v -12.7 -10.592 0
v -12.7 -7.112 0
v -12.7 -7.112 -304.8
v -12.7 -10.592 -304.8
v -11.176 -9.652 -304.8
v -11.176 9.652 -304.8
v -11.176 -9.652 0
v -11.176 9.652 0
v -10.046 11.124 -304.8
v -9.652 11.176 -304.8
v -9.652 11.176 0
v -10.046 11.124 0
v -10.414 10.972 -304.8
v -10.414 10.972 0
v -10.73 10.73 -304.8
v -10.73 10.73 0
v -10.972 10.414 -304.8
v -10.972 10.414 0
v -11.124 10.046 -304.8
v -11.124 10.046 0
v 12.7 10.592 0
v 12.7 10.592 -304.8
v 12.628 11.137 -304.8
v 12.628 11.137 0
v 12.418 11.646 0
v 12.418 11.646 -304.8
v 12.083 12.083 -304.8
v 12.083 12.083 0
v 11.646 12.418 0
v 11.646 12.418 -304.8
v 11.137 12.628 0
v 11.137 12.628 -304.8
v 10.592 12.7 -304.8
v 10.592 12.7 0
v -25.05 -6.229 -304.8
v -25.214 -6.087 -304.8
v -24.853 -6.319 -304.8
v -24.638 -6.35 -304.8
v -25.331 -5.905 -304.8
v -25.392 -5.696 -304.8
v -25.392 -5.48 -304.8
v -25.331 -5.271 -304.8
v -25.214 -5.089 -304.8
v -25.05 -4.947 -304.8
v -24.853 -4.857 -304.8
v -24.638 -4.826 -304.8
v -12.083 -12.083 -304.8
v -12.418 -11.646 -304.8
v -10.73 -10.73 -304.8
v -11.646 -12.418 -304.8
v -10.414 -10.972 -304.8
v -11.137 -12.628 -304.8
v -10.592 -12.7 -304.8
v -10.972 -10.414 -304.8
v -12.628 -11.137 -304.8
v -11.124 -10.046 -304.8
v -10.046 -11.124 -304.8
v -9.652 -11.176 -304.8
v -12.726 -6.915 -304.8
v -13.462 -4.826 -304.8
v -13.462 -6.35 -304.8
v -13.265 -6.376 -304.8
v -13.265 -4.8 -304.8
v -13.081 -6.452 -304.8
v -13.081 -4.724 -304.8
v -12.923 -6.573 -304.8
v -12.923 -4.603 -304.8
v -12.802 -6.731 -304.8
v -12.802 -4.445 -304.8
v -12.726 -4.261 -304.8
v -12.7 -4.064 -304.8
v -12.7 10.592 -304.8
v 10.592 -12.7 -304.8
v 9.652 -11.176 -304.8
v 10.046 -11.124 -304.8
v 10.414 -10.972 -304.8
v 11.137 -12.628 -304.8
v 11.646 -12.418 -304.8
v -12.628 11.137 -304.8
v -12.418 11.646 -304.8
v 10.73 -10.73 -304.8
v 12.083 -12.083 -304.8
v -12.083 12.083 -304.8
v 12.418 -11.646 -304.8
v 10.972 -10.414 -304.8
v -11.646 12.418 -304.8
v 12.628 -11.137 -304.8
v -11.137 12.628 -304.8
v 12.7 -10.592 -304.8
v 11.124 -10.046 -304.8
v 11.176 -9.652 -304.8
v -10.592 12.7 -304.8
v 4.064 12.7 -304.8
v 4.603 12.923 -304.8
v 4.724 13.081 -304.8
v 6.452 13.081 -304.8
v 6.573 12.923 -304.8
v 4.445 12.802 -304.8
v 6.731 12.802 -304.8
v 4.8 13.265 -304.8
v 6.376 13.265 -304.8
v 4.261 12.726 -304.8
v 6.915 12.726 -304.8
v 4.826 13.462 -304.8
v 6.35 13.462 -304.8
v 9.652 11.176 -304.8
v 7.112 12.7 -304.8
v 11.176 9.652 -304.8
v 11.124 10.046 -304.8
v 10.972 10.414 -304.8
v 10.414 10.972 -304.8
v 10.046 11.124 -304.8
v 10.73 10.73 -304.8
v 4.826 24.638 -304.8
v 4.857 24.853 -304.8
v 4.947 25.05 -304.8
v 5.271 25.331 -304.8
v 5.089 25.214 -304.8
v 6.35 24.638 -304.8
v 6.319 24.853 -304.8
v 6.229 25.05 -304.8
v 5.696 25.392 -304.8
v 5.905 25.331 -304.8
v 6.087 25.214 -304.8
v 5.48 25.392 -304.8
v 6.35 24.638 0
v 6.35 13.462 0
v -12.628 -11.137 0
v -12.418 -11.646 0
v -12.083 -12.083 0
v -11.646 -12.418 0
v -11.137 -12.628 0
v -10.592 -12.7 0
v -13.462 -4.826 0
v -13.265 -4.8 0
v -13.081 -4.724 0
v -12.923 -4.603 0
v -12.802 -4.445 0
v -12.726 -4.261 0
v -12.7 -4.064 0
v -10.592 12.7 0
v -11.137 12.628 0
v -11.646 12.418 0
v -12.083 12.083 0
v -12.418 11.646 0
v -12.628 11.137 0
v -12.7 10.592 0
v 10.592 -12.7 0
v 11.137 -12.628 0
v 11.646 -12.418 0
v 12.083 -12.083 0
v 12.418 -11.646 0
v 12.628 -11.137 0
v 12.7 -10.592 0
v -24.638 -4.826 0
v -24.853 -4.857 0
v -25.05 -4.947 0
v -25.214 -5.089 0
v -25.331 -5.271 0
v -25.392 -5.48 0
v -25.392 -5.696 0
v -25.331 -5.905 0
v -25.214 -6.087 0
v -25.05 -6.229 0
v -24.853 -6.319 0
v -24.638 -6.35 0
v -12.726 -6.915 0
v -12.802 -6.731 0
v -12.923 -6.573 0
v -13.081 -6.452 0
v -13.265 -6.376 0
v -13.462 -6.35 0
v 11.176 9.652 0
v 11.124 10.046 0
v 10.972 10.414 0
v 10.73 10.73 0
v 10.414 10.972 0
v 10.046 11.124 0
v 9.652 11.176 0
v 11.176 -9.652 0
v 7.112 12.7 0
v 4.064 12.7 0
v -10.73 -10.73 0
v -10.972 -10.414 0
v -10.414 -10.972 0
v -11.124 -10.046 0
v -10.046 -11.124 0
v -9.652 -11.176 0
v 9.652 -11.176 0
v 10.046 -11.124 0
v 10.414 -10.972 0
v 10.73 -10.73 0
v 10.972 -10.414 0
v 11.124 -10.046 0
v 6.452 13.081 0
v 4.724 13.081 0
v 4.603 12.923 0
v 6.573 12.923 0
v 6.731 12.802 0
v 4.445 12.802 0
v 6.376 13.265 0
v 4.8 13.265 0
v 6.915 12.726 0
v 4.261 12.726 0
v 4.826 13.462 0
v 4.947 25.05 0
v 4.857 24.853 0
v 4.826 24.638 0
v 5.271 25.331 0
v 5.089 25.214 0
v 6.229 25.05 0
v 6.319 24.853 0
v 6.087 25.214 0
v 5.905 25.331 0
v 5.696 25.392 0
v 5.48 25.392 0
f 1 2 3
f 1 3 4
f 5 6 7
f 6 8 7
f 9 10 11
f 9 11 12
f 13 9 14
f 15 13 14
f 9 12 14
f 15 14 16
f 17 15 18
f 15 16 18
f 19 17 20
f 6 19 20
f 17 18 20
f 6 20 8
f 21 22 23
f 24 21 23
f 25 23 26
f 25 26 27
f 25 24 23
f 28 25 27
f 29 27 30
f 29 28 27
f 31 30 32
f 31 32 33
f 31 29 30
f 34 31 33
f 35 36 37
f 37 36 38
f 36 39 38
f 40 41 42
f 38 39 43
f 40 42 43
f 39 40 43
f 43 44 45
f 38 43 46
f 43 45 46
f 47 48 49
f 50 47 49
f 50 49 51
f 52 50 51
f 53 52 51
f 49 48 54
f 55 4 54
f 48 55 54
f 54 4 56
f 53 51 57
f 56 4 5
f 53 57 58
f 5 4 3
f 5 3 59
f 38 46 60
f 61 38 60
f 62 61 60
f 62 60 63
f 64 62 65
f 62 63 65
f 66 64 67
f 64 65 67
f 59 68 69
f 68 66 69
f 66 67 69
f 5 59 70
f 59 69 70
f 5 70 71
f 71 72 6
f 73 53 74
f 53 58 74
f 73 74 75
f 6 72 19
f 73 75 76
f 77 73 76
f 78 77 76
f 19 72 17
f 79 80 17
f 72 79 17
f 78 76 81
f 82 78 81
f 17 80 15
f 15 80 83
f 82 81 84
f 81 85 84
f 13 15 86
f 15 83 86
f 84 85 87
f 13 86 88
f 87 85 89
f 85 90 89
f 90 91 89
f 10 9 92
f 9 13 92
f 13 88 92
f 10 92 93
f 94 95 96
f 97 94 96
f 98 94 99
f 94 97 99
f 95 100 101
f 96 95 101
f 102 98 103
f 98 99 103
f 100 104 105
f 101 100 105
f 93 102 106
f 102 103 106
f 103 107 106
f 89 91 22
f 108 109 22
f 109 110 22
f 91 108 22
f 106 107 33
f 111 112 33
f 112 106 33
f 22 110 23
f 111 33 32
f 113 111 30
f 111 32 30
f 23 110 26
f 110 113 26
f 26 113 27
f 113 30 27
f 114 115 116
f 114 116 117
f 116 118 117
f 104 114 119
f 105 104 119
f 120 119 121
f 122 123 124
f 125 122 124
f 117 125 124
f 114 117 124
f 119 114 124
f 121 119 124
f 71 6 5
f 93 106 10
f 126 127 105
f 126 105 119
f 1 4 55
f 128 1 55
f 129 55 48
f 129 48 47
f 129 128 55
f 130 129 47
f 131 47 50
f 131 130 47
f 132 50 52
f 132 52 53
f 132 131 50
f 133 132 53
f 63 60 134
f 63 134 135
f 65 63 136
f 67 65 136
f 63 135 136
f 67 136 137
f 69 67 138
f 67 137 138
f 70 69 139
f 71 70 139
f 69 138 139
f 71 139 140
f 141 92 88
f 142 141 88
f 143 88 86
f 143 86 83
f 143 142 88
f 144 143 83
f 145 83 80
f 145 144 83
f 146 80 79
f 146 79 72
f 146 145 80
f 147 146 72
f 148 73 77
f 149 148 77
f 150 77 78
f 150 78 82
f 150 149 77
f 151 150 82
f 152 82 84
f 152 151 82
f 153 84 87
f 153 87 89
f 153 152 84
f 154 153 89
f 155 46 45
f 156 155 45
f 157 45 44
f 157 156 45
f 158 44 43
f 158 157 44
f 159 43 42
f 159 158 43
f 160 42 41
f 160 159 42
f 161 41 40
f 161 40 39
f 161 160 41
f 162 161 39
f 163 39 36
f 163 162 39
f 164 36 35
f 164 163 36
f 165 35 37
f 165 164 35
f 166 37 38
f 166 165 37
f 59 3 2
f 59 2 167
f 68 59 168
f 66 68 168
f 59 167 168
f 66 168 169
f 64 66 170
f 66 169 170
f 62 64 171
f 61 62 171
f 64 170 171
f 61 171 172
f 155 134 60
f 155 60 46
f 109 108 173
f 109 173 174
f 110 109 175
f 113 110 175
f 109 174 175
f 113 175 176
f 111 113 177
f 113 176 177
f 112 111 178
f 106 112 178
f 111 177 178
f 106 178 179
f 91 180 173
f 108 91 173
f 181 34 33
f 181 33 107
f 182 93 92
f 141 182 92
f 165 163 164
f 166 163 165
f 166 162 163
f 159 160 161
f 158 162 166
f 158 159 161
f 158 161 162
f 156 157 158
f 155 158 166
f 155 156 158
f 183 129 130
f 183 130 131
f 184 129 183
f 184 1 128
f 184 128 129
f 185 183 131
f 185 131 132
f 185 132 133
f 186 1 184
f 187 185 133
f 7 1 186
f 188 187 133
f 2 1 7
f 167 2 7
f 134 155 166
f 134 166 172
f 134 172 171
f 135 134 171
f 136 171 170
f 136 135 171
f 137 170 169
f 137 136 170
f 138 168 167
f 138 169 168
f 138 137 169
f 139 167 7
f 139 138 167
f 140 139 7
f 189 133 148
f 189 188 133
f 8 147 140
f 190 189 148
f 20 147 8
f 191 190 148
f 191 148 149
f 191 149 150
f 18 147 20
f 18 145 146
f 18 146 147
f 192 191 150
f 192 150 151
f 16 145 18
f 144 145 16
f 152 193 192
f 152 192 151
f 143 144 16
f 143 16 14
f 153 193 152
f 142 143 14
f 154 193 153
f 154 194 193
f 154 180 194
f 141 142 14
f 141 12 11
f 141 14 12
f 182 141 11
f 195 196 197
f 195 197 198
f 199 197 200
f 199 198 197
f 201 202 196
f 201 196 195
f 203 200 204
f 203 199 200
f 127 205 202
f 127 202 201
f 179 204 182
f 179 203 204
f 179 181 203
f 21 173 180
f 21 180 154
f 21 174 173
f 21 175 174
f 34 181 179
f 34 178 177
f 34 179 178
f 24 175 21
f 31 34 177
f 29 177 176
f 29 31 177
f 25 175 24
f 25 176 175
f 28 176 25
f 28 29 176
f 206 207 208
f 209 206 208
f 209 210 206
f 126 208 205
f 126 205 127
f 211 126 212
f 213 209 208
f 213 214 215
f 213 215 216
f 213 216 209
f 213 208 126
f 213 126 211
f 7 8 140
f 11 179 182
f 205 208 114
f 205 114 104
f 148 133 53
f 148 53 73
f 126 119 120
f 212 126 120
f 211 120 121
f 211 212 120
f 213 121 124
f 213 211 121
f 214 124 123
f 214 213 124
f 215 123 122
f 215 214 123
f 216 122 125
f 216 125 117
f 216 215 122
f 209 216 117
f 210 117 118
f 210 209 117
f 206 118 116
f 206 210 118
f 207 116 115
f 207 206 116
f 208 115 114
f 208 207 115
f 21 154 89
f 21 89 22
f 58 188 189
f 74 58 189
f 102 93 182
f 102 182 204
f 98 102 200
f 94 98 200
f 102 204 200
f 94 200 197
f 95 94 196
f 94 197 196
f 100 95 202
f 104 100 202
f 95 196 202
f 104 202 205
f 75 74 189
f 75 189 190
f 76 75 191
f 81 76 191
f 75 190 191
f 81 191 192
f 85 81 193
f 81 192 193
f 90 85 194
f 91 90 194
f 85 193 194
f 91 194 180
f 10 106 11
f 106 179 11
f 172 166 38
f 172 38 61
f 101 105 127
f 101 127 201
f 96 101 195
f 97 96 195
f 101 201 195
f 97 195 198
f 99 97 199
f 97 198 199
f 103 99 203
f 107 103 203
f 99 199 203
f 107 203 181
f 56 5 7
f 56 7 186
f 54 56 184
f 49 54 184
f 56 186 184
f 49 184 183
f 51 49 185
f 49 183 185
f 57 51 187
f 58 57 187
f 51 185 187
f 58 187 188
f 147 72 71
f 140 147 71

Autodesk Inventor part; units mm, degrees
ref_plane "YZ Plane" through (0, 0, 0) normal (1, 0, 0) x (0, 1, 0)
ref_plane "XZ Plane" through (0, 0, 0) normal (0, 1, 0) x (-1, 0, 0)
ref_plane "XY Plane" through (0, 0, 0) normal (0, 0, 1) x (1, 0, 0)
sketch "Sketch1" plane through (0, 0, 0) normal (0, 0, 1) x (1, 0, 0)
  line L0 (11.176, -9.652) -> (11.176, 9.652)
  arc A0 (9.652, -11.176) -> (11.176, -9.652) centre (9.652, -9.652) ccw
  line L1 (-9.652, -11.176) -> (9.652, -11.176)
  arc A1 (-11.176, -9.652) -> (-9.652, -11.176) centre (-9.652, -9.652) ccw
  line L2 (-11.176, 9.652) -> (-11.176, -9.652)
  arc A2 (-9.652, 11.176) -> (-11.176, 9.652) centre (-9.652, 9.652) ccw
  line L3 (9.652, 11.176) -> (-9.652, 11.176)
  arc A3 (11.176, 9.652) -> (9.652, 11.176) centre (9.652, 9.652) ccw
  arc A4 (6.35, 13.462) -> (7.112, 12.7) centre (7.112, 13.462) ccw
  line L4 (6.35, 13.462) -> (6.35, 24.638)
  arc A5 (6.35, 24.638) -> (4.826, 24.638) centre (5.588, 24.638) ccw
  line L5 (4.826, 24.638) -> (4.826, 13.462)
  arc A6 (4.064, 12.7) -> (4.826, 13.462) centre (4.064, 13.462) ccw
  line L6 (4.064, 12.7) -> (-10.5918, 12.7)
  arc A7 (-10.5918, 12.7) -> (-12.7, 10.5918) centre (-10.5918, 10.5918) ccw
  line L7 (-12.7, 10.5918) -> (-12.7, -4.064)
  arc A8 (-13.462, -4.826) -> (-12.7, -4.064) centre (-13.462, -4.064) ccw
  line L8 (-13.462, -4.826) -> (-24.638, -4.826)
  arc A9 (-24.638, -4.826) -> (-24.638, -6.35) centre (-24.638, -5.588) ccw
  line L9 (-24.638, -6.35) -> (-13.462, -6.35)
  arc A10 (-12.7, -7.112) -> (-13.462, -6.35) centre (-13.462, -7.112) ccw
  line L10 (-12.7, -7.112) -> (-12.7, -10.5918)
  arc A11 (-12.7, -10.5918) -> (-10.5918, -12.7) centre (-10.5918, -10.5918) ccw
  line L11 (-10.5918, -12.7) -> (10.5918, -12.7)
  arc A12 (10.5918, -12.7) -> (12.7, -10.5918) centre (10.5918, -10.5918) ccw
  line L12 (12.7, -10.5918) -> (12.7, 10.5918)
  arc A13 (12.7, 10.5918) -> (10.5918, 12.7) centre (10.5918, 10.5918) ccw
  line L13 (10.5918, 12.7) -> (7.112, 12.7)
  point P0 (0, 0)
extrude "Extrusion1" add sketch "Sketch1" against normal blind 304.8
properties part number "9010"
